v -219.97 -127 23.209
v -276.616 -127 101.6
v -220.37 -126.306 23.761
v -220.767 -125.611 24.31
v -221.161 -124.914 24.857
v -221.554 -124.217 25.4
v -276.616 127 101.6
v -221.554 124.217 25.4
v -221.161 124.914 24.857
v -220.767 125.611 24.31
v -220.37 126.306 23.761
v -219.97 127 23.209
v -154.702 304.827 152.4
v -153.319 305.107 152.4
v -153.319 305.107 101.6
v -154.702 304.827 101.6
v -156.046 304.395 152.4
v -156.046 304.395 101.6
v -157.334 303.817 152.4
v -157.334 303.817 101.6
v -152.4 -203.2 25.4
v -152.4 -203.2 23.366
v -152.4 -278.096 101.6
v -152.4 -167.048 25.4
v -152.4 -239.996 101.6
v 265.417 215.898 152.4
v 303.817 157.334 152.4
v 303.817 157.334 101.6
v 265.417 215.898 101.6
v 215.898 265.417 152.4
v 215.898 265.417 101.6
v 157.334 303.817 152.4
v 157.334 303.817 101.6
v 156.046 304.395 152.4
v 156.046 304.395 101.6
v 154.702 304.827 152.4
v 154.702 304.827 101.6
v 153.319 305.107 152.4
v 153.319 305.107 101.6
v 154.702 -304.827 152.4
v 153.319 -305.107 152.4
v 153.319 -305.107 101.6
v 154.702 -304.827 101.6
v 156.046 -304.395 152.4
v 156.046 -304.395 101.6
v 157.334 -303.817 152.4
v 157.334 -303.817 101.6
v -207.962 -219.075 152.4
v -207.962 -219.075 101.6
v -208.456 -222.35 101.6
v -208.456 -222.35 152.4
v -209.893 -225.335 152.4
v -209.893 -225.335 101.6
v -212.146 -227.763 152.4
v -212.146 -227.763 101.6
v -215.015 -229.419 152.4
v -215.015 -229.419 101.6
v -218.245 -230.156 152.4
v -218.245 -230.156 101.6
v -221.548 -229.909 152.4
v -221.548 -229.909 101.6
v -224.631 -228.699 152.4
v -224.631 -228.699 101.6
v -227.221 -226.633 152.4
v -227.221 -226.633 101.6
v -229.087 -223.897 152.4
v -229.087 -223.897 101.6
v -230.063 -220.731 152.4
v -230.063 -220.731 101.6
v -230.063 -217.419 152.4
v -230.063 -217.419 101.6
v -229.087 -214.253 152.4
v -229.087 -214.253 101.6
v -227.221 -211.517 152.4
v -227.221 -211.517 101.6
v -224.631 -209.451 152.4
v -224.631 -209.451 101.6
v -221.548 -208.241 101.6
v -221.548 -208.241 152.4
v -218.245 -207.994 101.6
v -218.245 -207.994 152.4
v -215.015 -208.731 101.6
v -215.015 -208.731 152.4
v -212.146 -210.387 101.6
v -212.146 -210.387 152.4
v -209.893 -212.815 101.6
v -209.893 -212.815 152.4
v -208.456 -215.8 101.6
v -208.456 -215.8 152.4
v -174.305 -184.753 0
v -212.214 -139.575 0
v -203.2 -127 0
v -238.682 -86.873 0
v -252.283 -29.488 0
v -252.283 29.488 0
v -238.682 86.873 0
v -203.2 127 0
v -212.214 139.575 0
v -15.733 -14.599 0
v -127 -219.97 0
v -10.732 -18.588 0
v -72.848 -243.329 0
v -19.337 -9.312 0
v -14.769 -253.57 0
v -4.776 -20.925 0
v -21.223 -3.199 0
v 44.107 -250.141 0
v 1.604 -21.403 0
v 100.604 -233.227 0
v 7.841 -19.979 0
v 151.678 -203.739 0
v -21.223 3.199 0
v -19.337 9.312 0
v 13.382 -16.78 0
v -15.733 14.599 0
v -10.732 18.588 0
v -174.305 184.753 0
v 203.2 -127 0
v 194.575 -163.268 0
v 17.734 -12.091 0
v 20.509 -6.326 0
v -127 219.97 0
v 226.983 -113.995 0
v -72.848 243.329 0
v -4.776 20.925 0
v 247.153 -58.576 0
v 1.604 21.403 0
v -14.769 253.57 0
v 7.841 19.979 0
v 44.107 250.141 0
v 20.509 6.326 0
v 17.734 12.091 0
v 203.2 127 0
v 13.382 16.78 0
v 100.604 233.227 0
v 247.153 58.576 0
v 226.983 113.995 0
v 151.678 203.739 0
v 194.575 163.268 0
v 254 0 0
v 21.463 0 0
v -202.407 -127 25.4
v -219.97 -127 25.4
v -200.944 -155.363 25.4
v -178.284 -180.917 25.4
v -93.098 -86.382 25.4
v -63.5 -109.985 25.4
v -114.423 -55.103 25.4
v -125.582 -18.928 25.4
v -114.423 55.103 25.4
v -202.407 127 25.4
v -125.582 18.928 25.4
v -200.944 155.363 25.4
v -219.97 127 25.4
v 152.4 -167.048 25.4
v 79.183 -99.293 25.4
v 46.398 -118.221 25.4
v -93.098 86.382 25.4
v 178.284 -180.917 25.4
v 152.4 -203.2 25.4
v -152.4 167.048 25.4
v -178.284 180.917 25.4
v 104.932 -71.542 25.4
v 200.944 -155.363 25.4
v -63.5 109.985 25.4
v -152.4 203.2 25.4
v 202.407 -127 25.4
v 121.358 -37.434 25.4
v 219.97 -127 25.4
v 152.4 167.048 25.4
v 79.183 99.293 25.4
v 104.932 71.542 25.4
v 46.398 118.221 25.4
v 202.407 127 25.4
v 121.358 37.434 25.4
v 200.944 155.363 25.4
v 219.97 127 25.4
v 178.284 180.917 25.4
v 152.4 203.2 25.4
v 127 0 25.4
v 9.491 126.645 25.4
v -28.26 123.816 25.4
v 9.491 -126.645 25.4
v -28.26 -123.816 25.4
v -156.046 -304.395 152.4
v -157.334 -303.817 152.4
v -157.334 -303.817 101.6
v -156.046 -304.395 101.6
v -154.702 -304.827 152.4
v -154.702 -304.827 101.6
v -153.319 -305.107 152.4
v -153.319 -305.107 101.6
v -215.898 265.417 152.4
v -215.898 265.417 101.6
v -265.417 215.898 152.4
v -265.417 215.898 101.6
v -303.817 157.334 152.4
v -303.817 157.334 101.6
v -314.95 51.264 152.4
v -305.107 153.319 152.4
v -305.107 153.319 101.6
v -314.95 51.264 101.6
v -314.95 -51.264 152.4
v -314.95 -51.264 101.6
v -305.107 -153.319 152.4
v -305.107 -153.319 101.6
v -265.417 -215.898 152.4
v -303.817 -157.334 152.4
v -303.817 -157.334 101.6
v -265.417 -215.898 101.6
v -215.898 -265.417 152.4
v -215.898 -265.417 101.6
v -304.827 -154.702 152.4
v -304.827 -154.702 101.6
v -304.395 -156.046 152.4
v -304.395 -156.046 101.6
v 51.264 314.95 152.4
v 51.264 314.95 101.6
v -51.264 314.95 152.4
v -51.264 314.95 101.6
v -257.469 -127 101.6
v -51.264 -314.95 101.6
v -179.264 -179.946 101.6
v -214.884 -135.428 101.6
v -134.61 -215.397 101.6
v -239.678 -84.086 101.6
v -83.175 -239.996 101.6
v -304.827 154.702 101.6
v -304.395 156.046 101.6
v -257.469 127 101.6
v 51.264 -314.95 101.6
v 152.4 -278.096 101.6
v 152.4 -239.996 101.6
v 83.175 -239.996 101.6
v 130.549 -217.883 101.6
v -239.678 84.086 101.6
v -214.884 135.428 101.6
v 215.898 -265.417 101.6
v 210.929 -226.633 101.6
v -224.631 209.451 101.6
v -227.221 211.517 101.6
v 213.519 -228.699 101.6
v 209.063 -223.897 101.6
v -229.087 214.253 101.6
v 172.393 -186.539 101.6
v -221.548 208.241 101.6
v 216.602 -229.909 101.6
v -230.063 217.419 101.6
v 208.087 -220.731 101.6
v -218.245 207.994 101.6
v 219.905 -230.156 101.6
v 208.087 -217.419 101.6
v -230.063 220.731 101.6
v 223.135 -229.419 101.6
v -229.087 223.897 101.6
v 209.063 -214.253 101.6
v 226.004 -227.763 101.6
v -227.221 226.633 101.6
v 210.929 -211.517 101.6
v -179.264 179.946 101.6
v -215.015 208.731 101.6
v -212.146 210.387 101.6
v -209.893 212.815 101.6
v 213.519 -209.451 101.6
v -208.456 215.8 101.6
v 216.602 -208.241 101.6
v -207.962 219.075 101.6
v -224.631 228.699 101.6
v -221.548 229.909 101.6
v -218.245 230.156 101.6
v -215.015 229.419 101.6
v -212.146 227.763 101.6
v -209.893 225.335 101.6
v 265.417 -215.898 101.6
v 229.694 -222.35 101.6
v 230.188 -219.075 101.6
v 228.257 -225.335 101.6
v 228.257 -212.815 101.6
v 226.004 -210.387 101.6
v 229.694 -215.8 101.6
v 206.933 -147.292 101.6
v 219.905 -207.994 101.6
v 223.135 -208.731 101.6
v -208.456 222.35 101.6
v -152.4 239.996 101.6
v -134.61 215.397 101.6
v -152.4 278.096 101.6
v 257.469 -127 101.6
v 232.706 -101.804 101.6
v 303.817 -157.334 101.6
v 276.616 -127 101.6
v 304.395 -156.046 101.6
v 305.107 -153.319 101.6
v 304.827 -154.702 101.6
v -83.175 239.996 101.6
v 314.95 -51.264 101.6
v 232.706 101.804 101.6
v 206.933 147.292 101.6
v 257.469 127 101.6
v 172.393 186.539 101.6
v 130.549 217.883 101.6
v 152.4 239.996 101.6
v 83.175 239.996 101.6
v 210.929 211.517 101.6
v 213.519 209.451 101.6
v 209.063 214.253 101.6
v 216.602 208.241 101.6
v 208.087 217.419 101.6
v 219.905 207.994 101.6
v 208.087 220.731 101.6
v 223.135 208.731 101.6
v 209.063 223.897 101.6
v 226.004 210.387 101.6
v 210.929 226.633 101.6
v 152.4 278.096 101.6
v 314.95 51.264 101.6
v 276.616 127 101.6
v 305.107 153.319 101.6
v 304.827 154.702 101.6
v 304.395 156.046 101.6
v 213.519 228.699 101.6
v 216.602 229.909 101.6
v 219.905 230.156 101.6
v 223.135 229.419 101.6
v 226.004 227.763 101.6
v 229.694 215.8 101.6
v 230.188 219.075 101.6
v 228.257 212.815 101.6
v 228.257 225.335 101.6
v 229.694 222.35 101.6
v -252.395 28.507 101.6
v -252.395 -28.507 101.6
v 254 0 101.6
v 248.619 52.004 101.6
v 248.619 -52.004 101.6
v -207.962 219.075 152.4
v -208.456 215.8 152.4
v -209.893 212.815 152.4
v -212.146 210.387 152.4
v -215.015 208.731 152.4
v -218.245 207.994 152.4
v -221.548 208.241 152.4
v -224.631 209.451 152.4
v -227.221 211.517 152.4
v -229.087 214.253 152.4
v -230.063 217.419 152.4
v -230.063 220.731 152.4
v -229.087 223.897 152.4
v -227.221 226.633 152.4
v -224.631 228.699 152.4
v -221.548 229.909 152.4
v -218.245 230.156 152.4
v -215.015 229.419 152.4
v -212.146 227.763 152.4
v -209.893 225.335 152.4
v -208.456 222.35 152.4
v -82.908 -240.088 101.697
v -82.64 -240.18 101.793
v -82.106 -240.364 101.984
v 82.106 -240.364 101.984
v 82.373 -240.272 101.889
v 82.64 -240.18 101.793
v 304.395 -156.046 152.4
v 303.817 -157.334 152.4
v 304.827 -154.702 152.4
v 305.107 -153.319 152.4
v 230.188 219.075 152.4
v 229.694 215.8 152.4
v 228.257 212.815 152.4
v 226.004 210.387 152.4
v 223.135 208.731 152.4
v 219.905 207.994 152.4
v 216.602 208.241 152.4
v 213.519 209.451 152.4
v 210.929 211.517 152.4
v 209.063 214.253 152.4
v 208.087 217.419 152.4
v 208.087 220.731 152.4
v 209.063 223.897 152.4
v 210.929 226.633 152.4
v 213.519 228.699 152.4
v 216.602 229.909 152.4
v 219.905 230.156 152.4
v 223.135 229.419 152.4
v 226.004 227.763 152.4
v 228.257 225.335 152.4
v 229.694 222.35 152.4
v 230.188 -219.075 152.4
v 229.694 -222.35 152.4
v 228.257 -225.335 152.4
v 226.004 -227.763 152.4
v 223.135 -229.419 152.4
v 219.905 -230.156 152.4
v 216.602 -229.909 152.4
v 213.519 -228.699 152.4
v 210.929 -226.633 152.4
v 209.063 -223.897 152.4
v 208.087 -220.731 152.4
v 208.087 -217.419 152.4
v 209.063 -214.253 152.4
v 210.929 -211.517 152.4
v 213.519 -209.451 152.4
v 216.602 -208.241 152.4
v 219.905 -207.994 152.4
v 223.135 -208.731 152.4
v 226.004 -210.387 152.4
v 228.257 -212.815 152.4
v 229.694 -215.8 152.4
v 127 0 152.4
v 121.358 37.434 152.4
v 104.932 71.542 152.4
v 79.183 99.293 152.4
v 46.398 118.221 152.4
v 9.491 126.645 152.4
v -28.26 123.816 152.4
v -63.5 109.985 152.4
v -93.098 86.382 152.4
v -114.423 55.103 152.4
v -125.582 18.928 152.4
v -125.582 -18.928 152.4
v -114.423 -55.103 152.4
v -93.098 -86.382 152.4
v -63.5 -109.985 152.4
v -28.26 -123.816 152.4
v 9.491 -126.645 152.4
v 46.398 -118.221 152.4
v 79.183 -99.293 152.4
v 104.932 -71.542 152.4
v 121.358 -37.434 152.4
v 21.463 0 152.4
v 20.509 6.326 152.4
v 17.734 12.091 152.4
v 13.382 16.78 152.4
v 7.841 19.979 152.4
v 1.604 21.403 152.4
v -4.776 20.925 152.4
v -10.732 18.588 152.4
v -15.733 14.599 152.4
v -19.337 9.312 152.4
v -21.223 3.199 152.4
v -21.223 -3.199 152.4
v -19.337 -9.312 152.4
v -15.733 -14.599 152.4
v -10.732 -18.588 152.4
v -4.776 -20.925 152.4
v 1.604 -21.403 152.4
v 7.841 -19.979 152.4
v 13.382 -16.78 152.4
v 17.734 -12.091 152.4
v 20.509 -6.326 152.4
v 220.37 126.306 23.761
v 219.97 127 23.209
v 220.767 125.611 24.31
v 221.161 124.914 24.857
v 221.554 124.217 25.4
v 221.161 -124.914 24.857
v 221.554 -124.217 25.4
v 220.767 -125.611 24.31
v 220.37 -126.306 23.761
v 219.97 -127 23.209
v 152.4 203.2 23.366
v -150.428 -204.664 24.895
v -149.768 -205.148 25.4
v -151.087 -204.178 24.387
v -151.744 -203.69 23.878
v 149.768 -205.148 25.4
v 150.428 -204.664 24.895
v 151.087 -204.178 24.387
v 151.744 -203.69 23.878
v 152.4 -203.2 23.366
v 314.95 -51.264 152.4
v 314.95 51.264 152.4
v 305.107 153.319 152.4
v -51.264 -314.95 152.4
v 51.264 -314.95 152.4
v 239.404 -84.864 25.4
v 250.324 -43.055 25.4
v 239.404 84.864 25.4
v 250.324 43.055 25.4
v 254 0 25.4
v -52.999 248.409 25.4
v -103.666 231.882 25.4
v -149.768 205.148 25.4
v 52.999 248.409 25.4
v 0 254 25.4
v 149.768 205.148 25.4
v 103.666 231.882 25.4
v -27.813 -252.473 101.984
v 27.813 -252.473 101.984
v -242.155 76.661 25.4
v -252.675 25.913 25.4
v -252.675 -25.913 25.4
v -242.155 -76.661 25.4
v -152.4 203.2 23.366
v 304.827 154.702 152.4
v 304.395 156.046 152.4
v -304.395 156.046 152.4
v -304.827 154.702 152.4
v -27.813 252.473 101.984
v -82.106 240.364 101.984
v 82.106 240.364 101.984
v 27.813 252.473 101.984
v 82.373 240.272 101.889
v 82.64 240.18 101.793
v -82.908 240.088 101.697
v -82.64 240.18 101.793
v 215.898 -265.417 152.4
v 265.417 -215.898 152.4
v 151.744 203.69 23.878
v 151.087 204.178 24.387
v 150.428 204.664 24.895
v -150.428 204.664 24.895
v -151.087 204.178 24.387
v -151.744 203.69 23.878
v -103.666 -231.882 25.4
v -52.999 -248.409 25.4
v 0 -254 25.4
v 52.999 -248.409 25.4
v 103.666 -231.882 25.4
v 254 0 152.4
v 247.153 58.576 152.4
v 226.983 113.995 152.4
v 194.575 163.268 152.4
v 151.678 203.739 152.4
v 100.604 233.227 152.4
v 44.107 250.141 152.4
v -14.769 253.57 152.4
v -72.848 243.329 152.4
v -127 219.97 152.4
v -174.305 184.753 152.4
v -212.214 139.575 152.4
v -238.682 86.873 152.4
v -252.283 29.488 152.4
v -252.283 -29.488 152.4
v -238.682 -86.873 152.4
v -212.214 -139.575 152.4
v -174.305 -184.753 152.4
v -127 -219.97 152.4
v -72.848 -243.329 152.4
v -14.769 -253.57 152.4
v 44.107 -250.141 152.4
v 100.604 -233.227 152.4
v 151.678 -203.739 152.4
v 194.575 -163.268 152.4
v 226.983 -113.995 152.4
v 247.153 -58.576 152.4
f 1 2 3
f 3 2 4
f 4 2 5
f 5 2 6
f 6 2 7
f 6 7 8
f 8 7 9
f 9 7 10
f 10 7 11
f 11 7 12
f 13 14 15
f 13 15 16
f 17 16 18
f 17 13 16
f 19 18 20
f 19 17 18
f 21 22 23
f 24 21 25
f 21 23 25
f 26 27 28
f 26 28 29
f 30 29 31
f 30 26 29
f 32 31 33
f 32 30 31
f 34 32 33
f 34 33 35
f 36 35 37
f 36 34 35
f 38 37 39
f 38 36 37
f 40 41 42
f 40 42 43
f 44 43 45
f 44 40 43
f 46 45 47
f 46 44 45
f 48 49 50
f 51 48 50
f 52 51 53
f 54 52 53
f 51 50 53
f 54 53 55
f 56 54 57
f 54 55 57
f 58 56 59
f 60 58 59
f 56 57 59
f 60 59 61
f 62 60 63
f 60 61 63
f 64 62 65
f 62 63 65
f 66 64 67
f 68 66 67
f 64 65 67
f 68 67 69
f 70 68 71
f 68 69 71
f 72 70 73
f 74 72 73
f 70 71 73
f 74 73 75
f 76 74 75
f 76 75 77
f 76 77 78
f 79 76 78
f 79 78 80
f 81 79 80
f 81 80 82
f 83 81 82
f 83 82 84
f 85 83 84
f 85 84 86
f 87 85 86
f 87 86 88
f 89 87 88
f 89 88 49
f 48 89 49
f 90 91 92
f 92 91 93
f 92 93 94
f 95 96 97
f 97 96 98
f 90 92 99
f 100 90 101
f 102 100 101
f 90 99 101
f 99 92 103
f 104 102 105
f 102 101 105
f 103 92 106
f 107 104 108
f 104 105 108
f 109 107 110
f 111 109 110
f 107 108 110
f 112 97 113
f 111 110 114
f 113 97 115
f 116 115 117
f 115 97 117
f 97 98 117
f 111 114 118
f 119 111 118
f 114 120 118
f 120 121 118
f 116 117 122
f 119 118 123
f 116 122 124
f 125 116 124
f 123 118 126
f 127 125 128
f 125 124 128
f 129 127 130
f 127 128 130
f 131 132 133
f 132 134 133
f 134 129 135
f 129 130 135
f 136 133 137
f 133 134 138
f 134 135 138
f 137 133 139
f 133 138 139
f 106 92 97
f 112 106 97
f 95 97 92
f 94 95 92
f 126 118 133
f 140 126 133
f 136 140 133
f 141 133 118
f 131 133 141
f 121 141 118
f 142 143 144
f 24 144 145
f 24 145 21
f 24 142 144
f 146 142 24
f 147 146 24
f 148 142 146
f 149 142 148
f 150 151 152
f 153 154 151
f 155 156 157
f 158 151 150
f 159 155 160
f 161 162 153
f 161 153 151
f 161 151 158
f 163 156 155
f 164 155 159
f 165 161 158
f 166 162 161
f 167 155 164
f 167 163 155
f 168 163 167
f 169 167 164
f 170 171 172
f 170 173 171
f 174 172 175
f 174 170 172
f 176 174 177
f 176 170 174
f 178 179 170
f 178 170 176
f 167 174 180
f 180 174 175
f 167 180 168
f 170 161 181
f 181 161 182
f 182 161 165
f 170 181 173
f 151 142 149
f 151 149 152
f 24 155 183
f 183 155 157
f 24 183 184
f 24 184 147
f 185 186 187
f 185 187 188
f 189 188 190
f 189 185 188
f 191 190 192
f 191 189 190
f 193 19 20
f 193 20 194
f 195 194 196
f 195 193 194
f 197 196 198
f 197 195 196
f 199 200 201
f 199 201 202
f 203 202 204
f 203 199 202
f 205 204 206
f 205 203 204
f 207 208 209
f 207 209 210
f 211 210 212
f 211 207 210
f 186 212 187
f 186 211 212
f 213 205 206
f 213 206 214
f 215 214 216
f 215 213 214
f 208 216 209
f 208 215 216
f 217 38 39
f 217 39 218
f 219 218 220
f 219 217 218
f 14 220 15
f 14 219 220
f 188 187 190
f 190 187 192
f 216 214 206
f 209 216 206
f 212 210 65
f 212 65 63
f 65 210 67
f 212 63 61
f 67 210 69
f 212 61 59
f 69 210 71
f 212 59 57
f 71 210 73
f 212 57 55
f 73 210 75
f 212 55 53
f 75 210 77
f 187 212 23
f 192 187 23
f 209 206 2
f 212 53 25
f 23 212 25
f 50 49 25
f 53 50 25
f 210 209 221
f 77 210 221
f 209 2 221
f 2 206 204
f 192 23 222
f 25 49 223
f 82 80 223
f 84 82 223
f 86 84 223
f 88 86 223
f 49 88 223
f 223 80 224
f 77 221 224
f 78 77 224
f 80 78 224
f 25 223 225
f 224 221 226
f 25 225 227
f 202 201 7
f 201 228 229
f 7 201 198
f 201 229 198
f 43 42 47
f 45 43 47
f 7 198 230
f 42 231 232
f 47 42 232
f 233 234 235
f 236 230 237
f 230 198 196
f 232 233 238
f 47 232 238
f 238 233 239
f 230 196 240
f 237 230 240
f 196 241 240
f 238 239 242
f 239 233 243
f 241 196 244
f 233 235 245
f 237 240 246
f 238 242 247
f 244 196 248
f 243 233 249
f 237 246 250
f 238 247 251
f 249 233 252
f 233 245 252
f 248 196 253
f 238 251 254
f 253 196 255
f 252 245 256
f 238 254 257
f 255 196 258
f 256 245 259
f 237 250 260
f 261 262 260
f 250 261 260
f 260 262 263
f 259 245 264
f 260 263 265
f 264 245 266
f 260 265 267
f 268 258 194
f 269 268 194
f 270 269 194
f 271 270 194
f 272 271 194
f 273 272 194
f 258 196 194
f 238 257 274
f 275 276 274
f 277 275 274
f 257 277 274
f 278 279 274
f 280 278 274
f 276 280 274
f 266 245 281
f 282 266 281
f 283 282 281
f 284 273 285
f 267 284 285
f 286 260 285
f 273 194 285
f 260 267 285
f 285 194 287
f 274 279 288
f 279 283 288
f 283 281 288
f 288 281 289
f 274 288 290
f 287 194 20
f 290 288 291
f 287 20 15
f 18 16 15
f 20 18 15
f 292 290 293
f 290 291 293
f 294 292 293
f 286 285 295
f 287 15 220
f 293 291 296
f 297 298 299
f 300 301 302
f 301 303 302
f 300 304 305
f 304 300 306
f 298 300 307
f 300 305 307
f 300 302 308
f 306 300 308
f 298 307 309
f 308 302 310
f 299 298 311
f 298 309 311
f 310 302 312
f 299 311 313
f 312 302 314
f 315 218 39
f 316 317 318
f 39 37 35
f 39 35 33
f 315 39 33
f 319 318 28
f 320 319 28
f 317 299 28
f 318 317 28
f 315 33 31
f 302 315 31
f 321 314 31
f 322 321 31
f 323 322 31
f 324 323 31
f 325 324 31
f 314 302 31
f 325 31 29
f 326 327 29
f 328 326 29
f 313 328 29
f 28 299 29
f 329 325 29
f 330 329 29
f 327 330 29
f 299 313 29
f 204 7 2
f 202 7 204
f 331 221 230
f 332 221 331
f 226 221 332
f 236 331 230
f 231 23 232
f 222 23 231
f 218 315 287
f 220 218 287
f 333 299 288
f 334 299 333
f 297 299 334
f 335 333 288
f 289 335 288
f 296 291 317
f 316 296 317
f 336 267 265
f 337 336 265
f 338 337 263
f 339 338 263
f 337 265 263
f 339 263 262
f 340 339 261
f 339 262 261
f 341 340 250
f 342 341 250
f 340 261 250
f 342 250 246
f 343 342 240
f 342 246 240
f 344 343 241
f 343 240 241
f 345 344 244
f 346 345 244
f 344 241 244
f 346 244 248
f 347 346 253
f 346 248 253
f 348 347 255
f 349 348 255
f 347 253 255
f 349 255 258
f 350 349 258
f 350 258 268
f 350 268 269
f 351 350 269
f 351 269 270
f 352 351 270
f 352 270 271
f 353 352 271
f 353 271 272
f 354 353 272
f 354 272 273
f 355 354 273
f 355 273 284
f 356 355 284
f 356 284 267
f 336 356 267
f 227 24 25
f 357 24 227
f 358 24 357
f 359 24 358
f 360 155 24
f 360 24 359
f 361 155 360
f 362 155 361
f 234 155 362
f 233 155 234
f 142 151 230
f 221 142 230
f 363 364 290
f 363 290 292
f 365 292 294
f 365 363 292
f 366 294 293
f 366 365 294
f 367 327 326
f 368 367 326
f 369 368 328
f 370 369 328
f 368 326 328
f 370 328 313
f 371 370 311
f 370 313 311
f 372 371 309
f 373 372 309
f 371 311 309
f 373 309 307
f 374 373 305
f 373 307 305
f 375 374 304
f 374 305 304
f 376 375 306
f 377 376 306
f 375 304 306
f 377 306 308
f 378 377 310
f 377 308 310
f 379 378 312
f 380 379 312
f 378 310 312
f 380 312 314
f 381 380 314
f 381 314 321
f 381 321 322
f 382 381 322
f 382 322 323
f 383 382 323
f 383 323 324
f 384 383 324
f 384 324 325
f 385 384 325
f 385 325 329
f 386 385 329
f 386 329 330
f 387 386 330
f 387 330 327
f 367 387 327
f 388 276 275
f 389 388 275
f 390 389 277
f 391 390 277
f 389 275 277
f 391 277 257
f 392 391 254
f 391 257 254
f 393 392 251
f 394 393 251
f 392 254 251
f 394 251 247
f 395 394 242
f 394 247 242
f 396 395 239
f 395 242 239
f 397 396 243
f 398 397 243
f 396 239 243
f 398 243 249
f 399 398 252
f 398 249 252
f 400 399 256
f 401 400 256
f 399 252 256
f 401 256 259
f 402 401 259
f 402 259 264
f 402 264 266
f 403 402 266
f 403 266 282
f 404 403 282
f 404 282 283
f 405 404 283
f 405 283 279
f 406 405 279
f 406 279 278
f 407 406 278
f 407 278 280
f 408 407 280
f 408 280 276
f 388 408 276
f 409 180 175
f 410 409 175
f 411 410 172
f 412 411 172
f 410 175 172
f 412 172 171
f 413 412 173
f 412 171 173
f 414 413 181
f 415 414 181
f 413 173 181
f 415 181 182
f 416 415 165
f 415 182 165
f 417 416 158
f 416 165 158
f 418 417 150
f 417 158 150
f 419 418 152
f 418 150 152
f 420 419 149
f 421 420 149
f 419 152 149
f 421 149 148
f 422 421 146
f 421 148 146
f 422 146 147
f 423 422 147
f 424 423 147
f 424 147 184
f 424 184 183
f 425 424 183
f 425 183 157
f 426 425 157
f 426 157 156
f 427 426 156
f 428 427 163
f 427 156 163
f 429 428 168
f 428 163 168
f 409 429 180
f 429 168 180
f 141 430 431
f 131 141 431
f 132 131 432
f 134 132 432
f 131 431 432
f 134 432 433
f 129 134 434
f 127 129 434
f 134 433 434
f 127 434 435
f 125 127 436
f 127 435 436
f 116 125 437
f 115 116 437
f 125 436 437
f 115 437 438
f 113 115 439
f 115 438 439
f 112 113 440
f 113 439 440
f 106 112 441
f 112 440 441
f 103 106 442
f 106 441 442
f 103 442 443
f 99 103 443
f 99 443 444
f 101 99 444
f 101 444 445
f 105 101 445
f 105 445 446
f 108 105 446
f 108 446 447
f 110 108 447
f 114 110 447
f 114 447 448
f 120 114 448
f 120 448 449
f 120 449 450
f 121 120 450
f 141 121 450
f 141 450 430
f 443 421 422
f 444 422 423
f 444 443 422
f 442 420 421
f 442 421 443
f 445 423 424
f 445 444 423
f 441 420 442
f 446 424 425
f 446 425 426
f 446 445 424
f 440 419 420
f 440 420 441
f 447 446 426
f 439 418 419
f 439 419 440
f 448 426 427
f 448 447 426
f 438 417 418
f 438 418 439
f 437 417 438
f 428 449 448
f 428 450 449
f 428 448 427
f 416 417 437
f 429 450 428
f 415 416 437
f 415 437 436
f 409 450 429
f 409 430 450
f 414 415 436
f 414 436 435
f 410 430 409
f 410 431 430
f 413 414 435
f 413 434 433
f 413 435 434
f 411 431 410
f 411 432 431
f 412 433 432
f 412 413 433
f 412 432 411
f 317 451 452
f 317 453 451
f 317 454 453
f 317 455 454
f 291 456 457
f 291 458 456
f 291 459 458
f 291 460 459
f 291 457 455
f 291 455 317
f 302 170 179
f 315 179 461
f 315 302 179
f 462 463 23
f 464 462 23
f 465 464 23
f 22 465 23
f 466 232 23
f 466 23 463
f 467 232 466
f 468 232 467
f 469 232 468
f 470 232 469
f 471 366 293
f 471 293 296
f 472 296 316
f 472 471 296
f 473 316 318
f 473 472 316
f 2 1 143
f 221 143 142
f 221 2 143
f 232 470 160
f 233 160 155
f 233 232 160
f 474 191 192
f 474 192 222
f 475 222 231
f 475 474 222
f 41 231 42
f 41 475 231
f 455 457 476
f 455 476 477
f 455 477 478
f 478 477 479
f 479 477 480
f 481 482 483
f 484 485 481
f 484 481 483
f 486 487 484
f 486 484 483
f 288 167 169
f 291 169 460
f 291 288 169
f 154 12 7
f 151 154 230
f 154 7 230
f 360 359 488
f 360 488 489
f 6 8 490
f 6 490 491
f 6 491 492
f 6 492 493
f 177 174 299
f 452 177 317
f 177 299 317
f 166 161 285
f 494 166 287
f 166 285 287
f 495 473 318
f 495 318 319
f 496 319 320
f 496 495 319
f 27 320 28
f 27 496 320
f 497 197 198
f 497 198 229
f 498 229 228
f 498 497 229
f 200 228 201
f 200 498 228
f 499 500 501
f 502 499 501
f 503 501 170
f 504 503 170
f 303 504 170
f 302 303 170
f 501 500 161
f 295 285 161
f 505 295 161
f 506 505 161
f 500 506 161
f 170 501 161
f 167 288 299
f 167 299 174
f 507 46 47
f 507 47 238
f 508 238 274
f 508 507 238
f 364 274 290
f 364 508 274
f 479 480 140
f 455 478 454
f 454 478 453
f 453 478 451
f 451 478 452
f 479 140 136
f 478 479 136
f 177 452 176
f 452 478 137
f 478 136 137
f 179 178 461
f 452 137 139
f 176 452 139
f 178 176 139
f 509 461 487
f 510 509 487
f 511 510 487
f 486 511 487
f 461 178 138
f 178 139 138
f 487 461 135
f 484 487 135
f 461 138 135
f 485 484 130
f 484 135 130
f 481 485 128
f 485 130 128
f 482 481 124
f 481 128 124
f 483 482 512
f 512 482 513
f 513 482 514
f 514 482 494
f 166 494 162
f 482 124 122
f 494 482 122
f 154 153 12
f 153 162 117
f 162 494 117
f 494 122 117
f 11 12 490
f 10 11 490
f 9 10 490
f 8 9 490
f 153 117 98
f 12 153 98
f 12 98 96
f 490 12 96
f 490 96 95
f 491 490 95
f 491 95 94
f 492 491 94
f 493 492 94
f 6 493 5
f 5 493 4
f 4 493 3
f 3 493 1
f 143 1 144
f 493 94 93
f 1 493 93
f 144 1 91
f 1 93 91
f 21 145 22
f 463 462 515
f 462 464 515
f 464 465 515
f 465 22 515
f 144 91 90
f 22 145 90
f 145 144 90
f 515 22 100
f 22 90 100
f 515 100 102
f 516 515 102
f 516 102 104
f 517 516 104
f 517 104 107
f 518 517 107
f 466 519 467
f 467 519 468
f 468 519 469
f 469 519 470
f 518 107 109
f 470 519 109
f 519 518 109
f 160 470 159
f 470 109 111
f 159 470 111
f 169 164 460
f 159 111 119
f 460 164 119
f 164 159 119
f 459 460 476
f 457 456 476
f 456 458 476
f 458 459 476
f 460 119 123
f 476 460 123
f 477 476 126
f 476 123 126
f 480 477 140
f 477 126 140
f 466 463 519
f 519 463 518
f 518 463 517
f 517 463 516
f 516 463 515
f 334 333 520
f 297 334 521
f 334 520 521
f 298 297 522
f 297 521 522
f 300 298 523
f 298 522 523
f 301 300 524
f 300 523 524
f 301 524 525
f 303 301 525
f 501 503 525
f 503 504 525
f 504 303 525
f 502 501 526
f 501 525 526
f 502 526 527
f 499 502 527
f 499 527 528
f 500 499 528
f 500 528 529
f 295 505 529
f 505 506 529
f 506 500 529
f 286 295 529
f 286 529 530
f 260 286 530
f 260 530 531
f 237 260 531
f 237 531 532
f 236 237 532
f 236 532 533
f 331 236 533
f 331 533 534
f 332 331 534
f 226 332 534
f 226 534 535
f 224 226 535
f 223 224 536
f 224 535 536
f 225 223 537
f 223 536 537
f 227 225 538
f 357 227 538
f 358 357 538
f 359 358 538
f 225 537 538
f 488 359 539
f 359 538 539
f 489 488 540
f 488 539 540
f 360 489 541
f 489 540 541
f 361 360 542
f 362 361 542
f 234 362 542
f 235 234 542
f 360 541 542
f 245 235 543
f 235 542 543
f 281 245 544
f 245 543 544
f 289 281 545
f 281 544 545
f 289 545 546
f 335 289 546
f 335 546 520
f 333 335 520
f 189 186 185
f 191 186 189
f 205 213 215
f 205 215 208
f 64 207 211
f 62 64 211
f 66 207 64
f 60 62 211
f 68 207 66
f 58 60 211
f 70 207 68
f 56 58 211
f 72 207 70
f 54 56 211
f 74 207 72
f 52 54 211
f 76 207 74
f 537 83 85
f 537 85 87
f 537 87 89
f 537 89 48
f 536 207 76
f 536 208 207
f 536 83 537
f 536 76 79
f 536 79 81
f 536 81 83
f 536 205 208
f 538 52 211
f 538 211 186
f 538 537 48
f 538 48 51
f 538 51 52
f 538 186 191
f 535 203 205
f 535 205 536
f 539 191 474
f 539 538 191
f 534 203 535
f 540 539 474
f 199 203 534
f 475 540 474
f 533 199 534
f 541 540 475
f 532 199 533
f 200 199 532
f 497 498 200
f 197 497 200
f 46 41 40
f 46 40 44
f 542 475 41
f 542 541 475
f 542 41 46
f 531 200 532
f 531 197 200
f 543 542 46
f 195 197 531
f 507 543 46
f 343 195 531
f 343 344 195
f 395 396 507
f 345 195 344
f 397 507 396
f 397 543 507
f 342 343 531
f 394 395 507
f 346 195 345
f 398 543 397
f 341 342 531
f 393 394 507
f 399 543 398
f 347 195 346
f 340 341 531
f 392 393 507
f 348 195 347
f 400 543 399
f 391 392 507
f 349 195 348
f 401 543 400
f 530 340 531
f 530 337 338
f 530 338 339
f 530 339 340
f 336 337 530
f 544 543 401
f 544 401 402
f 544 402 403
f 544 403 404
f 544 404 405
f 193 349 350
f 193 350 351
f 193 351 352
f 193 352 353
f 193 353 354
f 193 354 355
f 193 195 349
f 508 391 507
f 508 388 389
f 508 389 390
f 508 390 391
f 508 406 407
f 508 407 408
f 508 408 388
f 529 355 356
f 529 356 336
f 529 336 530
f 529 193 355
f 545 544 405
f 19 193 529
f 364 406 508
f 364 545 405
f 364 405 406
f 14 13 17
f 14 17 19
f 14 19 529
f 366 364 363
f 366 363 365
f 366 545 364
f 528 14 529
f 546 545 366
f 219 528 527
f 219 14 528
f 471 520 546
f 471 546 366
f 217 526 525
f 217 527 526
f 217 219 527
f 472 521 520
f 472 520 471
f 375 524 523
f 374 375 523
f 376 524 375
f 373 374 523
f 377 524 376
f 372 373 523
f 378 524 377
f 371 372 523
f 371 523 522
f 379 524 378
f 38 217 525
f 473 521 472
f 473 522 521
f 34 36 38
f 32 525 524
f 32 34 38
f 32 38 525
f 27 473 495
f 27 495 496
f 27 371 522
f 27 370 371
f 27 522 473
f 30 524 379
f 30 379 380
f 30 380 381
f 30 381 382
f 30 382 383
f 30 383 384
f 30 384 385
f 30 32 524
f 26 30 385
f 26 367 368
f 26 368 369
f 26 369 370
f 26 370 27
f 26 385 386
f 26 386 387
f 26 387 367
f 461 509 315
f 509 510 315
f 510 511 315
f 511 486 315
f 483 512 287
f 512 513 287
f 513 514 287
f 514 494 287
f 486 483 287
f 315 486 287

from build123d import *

# Parameters (mm, degrees)
F0_R      = 254
F1_DEPTH  = 25.4
F3_R      = 254
F4_DEPTH  = 50.8
F6_DEPTH  = 127
F8_DEPTH  = 152.4
F9_R      = 127
F10_DEPTH = 127
F11_R     = 21.463
F12_DEPTH = 152.401
F13_R     = 11.1125
F14_DEPTH = 50.801


with BuildPart() as f1:
    # F0 (on Top) → F1 (new body)
    with BuildSketch(Plane.XY):
        Circle(F0_R)
    extrude(amount=F1_DEPTH)



with BuildPart() as f4:
    # F3 (on offset) → F4 (new body)
    with BuildSketch(Plane.XY.offset(152.4)):
        with BuildLine():
            ThreePointArc((-305.1073144143, -153.3185779875), (-304.6298197167, -155.3799861666), (-303.8166886514, -157.3335016483))
            ThreePointArc((-303.8166886514, -157.3335016483), (-241.9280999016, -241.9280999016), (-157.3335016483, -303.8166886514))
            ThreePointArc((-157.3335016483, -303.8166886514), (-155.3799861666, -304.6298197167), (-153.3185779875, -305.1073144143))
            ThreePointArc((-153.3185779875, -305.1073144143), (0, -316.1821353814), (153.3185779875, -305.1073144143))
            ThreePointArc((153.3185779875, -305.1073144143), (155.3799861666, -304.6298197167), (157.3335016483, -303.8166886514))
            ThreePointArc((157.3335016483, -303.8166886514), (241.9280999016, -241.9280999016), (303.8166886514, -157.3335016483))
            ThreePointArc((303.8166886514, -157.3335016483), (304.6298197167, -155.3799861666), (305.1073144143, -153.3185779875))
            ThreePointArc((305.1073144143, -153.3185779875), (316.1821353814, 0), (305.1073144143, 153.3185779875))
            ThreePointArc((305.1073144143, 153.3185779875), (304.6298197167, 155.3799861666), (303.8166886514, 157.3335016483))
            ThreePointArc((303.8166886514, 157.3335016483), (241.9280999016, 241.9280999016), (157.3335016483, 303.8166886514))
            ThreePointArc((157.3335016483, 303.8166886514), (155.3799861666, 304.6298197167), (153.3185779875, 305.1073144143))
            ThreePointArc((153.3185779875, 305.1073144143), (0, 316.1821353814), (-153.3185779875, 305.1073144143))
            ThreePointArc((-153.3185779875, 305.1073144143), (-155.3799861666, 304.6298197167), (-157.3335016483, 303.8166886514))
            ThreePointArc((-157.3335016483, 303.8166886514), (-241.9280999016, 241.9280999016), (-303.8166886514, 157.3335016483))
            ThreePointArc((-303.8166886514, 157.3335016483), (-304.6298197167, 155.3799861666), (-305.1073144143, 153.3185779875))
            ThreePointArc((-305.1073144143, 153.3185779875), (-316.1821353814, 0), (-305.1073144143, -153.3185779875))
        make_face()
        Circle(F3_R, mode=Mode.SUBTRACT)
    extrude(amount=-F4_DEPTH)


with BuildPart() as f1_1:
    add(f1.part)

    add(f4.part)  # F6 merges F4
    # F5 (on Front) → F6 (join, symmetric)
    with BuildSketch(Plane.XZ):
        Polygon((-279.2956233025, 105.3081825376), (-203.2, 0), (-196.8173876795, 17.664473254), (-260.1486742496, 105.3081825376), align=None)
        Polygon((196.8173876795, 17.664473254), (203.2, 0), (279.2956233025, 105.3081825376), (260.1486742496, 105.3081825376), align=None)
    extrude(amount=F6_DEPTH, both=True)

    # F7 (on Right) → F8 (join, symmetric)
    with BuildSketch(Plane.YZ):
        Polygon((165.1, 23.3656521887), (203.2, 23.3656521887), (278.463602066, 101.9842028618), (240.363602066, 101.9842028618), align=None)
        Polygon((-278.463602066, 101.9842028618), (-203.2, 23.3656521887), (-165.1, 23.3656521887), (-240.363602066, 101.9842028618), align=None)
    extrude(amount=F8_DEPTH, both=True)

    # F9 (on face) → F10 (join)
    with BuildSketch(Plane.XY.offset(25.4)):
        Circle(F9_R)
    extrude(amount=F10_DEPTH)

    # F11 (on face) → F12 (cut, through all)
    with BuildSketch(Plane.XY.offset(152.4)):
        Circle(F11_R)
    extrude(amount=-F12_DEPTH, mode=Mode.SUBTRACT)

    # F13 (on face) → F14 (cut, through all)
    with BuildSketch(Plane(origin=(0, 0, 101.6), x_dir=(1, 0, 0), z_dir=(0, 0, -1))):
        with Locations((219.075, 219.075)):
            Circle(F13_R)
        with Locations((219.075, -219.075)):
            Circle(F13_R)
        with Locations((-219.075, -219.075)):
            Circle(F13_R)
        with Locations((-219.075, 219.075)):
            Circle(F13_R)
    extrude(amount=-F14_DEPTH, mode=Mode.SUBTRACT)


solid = f1_1.part
